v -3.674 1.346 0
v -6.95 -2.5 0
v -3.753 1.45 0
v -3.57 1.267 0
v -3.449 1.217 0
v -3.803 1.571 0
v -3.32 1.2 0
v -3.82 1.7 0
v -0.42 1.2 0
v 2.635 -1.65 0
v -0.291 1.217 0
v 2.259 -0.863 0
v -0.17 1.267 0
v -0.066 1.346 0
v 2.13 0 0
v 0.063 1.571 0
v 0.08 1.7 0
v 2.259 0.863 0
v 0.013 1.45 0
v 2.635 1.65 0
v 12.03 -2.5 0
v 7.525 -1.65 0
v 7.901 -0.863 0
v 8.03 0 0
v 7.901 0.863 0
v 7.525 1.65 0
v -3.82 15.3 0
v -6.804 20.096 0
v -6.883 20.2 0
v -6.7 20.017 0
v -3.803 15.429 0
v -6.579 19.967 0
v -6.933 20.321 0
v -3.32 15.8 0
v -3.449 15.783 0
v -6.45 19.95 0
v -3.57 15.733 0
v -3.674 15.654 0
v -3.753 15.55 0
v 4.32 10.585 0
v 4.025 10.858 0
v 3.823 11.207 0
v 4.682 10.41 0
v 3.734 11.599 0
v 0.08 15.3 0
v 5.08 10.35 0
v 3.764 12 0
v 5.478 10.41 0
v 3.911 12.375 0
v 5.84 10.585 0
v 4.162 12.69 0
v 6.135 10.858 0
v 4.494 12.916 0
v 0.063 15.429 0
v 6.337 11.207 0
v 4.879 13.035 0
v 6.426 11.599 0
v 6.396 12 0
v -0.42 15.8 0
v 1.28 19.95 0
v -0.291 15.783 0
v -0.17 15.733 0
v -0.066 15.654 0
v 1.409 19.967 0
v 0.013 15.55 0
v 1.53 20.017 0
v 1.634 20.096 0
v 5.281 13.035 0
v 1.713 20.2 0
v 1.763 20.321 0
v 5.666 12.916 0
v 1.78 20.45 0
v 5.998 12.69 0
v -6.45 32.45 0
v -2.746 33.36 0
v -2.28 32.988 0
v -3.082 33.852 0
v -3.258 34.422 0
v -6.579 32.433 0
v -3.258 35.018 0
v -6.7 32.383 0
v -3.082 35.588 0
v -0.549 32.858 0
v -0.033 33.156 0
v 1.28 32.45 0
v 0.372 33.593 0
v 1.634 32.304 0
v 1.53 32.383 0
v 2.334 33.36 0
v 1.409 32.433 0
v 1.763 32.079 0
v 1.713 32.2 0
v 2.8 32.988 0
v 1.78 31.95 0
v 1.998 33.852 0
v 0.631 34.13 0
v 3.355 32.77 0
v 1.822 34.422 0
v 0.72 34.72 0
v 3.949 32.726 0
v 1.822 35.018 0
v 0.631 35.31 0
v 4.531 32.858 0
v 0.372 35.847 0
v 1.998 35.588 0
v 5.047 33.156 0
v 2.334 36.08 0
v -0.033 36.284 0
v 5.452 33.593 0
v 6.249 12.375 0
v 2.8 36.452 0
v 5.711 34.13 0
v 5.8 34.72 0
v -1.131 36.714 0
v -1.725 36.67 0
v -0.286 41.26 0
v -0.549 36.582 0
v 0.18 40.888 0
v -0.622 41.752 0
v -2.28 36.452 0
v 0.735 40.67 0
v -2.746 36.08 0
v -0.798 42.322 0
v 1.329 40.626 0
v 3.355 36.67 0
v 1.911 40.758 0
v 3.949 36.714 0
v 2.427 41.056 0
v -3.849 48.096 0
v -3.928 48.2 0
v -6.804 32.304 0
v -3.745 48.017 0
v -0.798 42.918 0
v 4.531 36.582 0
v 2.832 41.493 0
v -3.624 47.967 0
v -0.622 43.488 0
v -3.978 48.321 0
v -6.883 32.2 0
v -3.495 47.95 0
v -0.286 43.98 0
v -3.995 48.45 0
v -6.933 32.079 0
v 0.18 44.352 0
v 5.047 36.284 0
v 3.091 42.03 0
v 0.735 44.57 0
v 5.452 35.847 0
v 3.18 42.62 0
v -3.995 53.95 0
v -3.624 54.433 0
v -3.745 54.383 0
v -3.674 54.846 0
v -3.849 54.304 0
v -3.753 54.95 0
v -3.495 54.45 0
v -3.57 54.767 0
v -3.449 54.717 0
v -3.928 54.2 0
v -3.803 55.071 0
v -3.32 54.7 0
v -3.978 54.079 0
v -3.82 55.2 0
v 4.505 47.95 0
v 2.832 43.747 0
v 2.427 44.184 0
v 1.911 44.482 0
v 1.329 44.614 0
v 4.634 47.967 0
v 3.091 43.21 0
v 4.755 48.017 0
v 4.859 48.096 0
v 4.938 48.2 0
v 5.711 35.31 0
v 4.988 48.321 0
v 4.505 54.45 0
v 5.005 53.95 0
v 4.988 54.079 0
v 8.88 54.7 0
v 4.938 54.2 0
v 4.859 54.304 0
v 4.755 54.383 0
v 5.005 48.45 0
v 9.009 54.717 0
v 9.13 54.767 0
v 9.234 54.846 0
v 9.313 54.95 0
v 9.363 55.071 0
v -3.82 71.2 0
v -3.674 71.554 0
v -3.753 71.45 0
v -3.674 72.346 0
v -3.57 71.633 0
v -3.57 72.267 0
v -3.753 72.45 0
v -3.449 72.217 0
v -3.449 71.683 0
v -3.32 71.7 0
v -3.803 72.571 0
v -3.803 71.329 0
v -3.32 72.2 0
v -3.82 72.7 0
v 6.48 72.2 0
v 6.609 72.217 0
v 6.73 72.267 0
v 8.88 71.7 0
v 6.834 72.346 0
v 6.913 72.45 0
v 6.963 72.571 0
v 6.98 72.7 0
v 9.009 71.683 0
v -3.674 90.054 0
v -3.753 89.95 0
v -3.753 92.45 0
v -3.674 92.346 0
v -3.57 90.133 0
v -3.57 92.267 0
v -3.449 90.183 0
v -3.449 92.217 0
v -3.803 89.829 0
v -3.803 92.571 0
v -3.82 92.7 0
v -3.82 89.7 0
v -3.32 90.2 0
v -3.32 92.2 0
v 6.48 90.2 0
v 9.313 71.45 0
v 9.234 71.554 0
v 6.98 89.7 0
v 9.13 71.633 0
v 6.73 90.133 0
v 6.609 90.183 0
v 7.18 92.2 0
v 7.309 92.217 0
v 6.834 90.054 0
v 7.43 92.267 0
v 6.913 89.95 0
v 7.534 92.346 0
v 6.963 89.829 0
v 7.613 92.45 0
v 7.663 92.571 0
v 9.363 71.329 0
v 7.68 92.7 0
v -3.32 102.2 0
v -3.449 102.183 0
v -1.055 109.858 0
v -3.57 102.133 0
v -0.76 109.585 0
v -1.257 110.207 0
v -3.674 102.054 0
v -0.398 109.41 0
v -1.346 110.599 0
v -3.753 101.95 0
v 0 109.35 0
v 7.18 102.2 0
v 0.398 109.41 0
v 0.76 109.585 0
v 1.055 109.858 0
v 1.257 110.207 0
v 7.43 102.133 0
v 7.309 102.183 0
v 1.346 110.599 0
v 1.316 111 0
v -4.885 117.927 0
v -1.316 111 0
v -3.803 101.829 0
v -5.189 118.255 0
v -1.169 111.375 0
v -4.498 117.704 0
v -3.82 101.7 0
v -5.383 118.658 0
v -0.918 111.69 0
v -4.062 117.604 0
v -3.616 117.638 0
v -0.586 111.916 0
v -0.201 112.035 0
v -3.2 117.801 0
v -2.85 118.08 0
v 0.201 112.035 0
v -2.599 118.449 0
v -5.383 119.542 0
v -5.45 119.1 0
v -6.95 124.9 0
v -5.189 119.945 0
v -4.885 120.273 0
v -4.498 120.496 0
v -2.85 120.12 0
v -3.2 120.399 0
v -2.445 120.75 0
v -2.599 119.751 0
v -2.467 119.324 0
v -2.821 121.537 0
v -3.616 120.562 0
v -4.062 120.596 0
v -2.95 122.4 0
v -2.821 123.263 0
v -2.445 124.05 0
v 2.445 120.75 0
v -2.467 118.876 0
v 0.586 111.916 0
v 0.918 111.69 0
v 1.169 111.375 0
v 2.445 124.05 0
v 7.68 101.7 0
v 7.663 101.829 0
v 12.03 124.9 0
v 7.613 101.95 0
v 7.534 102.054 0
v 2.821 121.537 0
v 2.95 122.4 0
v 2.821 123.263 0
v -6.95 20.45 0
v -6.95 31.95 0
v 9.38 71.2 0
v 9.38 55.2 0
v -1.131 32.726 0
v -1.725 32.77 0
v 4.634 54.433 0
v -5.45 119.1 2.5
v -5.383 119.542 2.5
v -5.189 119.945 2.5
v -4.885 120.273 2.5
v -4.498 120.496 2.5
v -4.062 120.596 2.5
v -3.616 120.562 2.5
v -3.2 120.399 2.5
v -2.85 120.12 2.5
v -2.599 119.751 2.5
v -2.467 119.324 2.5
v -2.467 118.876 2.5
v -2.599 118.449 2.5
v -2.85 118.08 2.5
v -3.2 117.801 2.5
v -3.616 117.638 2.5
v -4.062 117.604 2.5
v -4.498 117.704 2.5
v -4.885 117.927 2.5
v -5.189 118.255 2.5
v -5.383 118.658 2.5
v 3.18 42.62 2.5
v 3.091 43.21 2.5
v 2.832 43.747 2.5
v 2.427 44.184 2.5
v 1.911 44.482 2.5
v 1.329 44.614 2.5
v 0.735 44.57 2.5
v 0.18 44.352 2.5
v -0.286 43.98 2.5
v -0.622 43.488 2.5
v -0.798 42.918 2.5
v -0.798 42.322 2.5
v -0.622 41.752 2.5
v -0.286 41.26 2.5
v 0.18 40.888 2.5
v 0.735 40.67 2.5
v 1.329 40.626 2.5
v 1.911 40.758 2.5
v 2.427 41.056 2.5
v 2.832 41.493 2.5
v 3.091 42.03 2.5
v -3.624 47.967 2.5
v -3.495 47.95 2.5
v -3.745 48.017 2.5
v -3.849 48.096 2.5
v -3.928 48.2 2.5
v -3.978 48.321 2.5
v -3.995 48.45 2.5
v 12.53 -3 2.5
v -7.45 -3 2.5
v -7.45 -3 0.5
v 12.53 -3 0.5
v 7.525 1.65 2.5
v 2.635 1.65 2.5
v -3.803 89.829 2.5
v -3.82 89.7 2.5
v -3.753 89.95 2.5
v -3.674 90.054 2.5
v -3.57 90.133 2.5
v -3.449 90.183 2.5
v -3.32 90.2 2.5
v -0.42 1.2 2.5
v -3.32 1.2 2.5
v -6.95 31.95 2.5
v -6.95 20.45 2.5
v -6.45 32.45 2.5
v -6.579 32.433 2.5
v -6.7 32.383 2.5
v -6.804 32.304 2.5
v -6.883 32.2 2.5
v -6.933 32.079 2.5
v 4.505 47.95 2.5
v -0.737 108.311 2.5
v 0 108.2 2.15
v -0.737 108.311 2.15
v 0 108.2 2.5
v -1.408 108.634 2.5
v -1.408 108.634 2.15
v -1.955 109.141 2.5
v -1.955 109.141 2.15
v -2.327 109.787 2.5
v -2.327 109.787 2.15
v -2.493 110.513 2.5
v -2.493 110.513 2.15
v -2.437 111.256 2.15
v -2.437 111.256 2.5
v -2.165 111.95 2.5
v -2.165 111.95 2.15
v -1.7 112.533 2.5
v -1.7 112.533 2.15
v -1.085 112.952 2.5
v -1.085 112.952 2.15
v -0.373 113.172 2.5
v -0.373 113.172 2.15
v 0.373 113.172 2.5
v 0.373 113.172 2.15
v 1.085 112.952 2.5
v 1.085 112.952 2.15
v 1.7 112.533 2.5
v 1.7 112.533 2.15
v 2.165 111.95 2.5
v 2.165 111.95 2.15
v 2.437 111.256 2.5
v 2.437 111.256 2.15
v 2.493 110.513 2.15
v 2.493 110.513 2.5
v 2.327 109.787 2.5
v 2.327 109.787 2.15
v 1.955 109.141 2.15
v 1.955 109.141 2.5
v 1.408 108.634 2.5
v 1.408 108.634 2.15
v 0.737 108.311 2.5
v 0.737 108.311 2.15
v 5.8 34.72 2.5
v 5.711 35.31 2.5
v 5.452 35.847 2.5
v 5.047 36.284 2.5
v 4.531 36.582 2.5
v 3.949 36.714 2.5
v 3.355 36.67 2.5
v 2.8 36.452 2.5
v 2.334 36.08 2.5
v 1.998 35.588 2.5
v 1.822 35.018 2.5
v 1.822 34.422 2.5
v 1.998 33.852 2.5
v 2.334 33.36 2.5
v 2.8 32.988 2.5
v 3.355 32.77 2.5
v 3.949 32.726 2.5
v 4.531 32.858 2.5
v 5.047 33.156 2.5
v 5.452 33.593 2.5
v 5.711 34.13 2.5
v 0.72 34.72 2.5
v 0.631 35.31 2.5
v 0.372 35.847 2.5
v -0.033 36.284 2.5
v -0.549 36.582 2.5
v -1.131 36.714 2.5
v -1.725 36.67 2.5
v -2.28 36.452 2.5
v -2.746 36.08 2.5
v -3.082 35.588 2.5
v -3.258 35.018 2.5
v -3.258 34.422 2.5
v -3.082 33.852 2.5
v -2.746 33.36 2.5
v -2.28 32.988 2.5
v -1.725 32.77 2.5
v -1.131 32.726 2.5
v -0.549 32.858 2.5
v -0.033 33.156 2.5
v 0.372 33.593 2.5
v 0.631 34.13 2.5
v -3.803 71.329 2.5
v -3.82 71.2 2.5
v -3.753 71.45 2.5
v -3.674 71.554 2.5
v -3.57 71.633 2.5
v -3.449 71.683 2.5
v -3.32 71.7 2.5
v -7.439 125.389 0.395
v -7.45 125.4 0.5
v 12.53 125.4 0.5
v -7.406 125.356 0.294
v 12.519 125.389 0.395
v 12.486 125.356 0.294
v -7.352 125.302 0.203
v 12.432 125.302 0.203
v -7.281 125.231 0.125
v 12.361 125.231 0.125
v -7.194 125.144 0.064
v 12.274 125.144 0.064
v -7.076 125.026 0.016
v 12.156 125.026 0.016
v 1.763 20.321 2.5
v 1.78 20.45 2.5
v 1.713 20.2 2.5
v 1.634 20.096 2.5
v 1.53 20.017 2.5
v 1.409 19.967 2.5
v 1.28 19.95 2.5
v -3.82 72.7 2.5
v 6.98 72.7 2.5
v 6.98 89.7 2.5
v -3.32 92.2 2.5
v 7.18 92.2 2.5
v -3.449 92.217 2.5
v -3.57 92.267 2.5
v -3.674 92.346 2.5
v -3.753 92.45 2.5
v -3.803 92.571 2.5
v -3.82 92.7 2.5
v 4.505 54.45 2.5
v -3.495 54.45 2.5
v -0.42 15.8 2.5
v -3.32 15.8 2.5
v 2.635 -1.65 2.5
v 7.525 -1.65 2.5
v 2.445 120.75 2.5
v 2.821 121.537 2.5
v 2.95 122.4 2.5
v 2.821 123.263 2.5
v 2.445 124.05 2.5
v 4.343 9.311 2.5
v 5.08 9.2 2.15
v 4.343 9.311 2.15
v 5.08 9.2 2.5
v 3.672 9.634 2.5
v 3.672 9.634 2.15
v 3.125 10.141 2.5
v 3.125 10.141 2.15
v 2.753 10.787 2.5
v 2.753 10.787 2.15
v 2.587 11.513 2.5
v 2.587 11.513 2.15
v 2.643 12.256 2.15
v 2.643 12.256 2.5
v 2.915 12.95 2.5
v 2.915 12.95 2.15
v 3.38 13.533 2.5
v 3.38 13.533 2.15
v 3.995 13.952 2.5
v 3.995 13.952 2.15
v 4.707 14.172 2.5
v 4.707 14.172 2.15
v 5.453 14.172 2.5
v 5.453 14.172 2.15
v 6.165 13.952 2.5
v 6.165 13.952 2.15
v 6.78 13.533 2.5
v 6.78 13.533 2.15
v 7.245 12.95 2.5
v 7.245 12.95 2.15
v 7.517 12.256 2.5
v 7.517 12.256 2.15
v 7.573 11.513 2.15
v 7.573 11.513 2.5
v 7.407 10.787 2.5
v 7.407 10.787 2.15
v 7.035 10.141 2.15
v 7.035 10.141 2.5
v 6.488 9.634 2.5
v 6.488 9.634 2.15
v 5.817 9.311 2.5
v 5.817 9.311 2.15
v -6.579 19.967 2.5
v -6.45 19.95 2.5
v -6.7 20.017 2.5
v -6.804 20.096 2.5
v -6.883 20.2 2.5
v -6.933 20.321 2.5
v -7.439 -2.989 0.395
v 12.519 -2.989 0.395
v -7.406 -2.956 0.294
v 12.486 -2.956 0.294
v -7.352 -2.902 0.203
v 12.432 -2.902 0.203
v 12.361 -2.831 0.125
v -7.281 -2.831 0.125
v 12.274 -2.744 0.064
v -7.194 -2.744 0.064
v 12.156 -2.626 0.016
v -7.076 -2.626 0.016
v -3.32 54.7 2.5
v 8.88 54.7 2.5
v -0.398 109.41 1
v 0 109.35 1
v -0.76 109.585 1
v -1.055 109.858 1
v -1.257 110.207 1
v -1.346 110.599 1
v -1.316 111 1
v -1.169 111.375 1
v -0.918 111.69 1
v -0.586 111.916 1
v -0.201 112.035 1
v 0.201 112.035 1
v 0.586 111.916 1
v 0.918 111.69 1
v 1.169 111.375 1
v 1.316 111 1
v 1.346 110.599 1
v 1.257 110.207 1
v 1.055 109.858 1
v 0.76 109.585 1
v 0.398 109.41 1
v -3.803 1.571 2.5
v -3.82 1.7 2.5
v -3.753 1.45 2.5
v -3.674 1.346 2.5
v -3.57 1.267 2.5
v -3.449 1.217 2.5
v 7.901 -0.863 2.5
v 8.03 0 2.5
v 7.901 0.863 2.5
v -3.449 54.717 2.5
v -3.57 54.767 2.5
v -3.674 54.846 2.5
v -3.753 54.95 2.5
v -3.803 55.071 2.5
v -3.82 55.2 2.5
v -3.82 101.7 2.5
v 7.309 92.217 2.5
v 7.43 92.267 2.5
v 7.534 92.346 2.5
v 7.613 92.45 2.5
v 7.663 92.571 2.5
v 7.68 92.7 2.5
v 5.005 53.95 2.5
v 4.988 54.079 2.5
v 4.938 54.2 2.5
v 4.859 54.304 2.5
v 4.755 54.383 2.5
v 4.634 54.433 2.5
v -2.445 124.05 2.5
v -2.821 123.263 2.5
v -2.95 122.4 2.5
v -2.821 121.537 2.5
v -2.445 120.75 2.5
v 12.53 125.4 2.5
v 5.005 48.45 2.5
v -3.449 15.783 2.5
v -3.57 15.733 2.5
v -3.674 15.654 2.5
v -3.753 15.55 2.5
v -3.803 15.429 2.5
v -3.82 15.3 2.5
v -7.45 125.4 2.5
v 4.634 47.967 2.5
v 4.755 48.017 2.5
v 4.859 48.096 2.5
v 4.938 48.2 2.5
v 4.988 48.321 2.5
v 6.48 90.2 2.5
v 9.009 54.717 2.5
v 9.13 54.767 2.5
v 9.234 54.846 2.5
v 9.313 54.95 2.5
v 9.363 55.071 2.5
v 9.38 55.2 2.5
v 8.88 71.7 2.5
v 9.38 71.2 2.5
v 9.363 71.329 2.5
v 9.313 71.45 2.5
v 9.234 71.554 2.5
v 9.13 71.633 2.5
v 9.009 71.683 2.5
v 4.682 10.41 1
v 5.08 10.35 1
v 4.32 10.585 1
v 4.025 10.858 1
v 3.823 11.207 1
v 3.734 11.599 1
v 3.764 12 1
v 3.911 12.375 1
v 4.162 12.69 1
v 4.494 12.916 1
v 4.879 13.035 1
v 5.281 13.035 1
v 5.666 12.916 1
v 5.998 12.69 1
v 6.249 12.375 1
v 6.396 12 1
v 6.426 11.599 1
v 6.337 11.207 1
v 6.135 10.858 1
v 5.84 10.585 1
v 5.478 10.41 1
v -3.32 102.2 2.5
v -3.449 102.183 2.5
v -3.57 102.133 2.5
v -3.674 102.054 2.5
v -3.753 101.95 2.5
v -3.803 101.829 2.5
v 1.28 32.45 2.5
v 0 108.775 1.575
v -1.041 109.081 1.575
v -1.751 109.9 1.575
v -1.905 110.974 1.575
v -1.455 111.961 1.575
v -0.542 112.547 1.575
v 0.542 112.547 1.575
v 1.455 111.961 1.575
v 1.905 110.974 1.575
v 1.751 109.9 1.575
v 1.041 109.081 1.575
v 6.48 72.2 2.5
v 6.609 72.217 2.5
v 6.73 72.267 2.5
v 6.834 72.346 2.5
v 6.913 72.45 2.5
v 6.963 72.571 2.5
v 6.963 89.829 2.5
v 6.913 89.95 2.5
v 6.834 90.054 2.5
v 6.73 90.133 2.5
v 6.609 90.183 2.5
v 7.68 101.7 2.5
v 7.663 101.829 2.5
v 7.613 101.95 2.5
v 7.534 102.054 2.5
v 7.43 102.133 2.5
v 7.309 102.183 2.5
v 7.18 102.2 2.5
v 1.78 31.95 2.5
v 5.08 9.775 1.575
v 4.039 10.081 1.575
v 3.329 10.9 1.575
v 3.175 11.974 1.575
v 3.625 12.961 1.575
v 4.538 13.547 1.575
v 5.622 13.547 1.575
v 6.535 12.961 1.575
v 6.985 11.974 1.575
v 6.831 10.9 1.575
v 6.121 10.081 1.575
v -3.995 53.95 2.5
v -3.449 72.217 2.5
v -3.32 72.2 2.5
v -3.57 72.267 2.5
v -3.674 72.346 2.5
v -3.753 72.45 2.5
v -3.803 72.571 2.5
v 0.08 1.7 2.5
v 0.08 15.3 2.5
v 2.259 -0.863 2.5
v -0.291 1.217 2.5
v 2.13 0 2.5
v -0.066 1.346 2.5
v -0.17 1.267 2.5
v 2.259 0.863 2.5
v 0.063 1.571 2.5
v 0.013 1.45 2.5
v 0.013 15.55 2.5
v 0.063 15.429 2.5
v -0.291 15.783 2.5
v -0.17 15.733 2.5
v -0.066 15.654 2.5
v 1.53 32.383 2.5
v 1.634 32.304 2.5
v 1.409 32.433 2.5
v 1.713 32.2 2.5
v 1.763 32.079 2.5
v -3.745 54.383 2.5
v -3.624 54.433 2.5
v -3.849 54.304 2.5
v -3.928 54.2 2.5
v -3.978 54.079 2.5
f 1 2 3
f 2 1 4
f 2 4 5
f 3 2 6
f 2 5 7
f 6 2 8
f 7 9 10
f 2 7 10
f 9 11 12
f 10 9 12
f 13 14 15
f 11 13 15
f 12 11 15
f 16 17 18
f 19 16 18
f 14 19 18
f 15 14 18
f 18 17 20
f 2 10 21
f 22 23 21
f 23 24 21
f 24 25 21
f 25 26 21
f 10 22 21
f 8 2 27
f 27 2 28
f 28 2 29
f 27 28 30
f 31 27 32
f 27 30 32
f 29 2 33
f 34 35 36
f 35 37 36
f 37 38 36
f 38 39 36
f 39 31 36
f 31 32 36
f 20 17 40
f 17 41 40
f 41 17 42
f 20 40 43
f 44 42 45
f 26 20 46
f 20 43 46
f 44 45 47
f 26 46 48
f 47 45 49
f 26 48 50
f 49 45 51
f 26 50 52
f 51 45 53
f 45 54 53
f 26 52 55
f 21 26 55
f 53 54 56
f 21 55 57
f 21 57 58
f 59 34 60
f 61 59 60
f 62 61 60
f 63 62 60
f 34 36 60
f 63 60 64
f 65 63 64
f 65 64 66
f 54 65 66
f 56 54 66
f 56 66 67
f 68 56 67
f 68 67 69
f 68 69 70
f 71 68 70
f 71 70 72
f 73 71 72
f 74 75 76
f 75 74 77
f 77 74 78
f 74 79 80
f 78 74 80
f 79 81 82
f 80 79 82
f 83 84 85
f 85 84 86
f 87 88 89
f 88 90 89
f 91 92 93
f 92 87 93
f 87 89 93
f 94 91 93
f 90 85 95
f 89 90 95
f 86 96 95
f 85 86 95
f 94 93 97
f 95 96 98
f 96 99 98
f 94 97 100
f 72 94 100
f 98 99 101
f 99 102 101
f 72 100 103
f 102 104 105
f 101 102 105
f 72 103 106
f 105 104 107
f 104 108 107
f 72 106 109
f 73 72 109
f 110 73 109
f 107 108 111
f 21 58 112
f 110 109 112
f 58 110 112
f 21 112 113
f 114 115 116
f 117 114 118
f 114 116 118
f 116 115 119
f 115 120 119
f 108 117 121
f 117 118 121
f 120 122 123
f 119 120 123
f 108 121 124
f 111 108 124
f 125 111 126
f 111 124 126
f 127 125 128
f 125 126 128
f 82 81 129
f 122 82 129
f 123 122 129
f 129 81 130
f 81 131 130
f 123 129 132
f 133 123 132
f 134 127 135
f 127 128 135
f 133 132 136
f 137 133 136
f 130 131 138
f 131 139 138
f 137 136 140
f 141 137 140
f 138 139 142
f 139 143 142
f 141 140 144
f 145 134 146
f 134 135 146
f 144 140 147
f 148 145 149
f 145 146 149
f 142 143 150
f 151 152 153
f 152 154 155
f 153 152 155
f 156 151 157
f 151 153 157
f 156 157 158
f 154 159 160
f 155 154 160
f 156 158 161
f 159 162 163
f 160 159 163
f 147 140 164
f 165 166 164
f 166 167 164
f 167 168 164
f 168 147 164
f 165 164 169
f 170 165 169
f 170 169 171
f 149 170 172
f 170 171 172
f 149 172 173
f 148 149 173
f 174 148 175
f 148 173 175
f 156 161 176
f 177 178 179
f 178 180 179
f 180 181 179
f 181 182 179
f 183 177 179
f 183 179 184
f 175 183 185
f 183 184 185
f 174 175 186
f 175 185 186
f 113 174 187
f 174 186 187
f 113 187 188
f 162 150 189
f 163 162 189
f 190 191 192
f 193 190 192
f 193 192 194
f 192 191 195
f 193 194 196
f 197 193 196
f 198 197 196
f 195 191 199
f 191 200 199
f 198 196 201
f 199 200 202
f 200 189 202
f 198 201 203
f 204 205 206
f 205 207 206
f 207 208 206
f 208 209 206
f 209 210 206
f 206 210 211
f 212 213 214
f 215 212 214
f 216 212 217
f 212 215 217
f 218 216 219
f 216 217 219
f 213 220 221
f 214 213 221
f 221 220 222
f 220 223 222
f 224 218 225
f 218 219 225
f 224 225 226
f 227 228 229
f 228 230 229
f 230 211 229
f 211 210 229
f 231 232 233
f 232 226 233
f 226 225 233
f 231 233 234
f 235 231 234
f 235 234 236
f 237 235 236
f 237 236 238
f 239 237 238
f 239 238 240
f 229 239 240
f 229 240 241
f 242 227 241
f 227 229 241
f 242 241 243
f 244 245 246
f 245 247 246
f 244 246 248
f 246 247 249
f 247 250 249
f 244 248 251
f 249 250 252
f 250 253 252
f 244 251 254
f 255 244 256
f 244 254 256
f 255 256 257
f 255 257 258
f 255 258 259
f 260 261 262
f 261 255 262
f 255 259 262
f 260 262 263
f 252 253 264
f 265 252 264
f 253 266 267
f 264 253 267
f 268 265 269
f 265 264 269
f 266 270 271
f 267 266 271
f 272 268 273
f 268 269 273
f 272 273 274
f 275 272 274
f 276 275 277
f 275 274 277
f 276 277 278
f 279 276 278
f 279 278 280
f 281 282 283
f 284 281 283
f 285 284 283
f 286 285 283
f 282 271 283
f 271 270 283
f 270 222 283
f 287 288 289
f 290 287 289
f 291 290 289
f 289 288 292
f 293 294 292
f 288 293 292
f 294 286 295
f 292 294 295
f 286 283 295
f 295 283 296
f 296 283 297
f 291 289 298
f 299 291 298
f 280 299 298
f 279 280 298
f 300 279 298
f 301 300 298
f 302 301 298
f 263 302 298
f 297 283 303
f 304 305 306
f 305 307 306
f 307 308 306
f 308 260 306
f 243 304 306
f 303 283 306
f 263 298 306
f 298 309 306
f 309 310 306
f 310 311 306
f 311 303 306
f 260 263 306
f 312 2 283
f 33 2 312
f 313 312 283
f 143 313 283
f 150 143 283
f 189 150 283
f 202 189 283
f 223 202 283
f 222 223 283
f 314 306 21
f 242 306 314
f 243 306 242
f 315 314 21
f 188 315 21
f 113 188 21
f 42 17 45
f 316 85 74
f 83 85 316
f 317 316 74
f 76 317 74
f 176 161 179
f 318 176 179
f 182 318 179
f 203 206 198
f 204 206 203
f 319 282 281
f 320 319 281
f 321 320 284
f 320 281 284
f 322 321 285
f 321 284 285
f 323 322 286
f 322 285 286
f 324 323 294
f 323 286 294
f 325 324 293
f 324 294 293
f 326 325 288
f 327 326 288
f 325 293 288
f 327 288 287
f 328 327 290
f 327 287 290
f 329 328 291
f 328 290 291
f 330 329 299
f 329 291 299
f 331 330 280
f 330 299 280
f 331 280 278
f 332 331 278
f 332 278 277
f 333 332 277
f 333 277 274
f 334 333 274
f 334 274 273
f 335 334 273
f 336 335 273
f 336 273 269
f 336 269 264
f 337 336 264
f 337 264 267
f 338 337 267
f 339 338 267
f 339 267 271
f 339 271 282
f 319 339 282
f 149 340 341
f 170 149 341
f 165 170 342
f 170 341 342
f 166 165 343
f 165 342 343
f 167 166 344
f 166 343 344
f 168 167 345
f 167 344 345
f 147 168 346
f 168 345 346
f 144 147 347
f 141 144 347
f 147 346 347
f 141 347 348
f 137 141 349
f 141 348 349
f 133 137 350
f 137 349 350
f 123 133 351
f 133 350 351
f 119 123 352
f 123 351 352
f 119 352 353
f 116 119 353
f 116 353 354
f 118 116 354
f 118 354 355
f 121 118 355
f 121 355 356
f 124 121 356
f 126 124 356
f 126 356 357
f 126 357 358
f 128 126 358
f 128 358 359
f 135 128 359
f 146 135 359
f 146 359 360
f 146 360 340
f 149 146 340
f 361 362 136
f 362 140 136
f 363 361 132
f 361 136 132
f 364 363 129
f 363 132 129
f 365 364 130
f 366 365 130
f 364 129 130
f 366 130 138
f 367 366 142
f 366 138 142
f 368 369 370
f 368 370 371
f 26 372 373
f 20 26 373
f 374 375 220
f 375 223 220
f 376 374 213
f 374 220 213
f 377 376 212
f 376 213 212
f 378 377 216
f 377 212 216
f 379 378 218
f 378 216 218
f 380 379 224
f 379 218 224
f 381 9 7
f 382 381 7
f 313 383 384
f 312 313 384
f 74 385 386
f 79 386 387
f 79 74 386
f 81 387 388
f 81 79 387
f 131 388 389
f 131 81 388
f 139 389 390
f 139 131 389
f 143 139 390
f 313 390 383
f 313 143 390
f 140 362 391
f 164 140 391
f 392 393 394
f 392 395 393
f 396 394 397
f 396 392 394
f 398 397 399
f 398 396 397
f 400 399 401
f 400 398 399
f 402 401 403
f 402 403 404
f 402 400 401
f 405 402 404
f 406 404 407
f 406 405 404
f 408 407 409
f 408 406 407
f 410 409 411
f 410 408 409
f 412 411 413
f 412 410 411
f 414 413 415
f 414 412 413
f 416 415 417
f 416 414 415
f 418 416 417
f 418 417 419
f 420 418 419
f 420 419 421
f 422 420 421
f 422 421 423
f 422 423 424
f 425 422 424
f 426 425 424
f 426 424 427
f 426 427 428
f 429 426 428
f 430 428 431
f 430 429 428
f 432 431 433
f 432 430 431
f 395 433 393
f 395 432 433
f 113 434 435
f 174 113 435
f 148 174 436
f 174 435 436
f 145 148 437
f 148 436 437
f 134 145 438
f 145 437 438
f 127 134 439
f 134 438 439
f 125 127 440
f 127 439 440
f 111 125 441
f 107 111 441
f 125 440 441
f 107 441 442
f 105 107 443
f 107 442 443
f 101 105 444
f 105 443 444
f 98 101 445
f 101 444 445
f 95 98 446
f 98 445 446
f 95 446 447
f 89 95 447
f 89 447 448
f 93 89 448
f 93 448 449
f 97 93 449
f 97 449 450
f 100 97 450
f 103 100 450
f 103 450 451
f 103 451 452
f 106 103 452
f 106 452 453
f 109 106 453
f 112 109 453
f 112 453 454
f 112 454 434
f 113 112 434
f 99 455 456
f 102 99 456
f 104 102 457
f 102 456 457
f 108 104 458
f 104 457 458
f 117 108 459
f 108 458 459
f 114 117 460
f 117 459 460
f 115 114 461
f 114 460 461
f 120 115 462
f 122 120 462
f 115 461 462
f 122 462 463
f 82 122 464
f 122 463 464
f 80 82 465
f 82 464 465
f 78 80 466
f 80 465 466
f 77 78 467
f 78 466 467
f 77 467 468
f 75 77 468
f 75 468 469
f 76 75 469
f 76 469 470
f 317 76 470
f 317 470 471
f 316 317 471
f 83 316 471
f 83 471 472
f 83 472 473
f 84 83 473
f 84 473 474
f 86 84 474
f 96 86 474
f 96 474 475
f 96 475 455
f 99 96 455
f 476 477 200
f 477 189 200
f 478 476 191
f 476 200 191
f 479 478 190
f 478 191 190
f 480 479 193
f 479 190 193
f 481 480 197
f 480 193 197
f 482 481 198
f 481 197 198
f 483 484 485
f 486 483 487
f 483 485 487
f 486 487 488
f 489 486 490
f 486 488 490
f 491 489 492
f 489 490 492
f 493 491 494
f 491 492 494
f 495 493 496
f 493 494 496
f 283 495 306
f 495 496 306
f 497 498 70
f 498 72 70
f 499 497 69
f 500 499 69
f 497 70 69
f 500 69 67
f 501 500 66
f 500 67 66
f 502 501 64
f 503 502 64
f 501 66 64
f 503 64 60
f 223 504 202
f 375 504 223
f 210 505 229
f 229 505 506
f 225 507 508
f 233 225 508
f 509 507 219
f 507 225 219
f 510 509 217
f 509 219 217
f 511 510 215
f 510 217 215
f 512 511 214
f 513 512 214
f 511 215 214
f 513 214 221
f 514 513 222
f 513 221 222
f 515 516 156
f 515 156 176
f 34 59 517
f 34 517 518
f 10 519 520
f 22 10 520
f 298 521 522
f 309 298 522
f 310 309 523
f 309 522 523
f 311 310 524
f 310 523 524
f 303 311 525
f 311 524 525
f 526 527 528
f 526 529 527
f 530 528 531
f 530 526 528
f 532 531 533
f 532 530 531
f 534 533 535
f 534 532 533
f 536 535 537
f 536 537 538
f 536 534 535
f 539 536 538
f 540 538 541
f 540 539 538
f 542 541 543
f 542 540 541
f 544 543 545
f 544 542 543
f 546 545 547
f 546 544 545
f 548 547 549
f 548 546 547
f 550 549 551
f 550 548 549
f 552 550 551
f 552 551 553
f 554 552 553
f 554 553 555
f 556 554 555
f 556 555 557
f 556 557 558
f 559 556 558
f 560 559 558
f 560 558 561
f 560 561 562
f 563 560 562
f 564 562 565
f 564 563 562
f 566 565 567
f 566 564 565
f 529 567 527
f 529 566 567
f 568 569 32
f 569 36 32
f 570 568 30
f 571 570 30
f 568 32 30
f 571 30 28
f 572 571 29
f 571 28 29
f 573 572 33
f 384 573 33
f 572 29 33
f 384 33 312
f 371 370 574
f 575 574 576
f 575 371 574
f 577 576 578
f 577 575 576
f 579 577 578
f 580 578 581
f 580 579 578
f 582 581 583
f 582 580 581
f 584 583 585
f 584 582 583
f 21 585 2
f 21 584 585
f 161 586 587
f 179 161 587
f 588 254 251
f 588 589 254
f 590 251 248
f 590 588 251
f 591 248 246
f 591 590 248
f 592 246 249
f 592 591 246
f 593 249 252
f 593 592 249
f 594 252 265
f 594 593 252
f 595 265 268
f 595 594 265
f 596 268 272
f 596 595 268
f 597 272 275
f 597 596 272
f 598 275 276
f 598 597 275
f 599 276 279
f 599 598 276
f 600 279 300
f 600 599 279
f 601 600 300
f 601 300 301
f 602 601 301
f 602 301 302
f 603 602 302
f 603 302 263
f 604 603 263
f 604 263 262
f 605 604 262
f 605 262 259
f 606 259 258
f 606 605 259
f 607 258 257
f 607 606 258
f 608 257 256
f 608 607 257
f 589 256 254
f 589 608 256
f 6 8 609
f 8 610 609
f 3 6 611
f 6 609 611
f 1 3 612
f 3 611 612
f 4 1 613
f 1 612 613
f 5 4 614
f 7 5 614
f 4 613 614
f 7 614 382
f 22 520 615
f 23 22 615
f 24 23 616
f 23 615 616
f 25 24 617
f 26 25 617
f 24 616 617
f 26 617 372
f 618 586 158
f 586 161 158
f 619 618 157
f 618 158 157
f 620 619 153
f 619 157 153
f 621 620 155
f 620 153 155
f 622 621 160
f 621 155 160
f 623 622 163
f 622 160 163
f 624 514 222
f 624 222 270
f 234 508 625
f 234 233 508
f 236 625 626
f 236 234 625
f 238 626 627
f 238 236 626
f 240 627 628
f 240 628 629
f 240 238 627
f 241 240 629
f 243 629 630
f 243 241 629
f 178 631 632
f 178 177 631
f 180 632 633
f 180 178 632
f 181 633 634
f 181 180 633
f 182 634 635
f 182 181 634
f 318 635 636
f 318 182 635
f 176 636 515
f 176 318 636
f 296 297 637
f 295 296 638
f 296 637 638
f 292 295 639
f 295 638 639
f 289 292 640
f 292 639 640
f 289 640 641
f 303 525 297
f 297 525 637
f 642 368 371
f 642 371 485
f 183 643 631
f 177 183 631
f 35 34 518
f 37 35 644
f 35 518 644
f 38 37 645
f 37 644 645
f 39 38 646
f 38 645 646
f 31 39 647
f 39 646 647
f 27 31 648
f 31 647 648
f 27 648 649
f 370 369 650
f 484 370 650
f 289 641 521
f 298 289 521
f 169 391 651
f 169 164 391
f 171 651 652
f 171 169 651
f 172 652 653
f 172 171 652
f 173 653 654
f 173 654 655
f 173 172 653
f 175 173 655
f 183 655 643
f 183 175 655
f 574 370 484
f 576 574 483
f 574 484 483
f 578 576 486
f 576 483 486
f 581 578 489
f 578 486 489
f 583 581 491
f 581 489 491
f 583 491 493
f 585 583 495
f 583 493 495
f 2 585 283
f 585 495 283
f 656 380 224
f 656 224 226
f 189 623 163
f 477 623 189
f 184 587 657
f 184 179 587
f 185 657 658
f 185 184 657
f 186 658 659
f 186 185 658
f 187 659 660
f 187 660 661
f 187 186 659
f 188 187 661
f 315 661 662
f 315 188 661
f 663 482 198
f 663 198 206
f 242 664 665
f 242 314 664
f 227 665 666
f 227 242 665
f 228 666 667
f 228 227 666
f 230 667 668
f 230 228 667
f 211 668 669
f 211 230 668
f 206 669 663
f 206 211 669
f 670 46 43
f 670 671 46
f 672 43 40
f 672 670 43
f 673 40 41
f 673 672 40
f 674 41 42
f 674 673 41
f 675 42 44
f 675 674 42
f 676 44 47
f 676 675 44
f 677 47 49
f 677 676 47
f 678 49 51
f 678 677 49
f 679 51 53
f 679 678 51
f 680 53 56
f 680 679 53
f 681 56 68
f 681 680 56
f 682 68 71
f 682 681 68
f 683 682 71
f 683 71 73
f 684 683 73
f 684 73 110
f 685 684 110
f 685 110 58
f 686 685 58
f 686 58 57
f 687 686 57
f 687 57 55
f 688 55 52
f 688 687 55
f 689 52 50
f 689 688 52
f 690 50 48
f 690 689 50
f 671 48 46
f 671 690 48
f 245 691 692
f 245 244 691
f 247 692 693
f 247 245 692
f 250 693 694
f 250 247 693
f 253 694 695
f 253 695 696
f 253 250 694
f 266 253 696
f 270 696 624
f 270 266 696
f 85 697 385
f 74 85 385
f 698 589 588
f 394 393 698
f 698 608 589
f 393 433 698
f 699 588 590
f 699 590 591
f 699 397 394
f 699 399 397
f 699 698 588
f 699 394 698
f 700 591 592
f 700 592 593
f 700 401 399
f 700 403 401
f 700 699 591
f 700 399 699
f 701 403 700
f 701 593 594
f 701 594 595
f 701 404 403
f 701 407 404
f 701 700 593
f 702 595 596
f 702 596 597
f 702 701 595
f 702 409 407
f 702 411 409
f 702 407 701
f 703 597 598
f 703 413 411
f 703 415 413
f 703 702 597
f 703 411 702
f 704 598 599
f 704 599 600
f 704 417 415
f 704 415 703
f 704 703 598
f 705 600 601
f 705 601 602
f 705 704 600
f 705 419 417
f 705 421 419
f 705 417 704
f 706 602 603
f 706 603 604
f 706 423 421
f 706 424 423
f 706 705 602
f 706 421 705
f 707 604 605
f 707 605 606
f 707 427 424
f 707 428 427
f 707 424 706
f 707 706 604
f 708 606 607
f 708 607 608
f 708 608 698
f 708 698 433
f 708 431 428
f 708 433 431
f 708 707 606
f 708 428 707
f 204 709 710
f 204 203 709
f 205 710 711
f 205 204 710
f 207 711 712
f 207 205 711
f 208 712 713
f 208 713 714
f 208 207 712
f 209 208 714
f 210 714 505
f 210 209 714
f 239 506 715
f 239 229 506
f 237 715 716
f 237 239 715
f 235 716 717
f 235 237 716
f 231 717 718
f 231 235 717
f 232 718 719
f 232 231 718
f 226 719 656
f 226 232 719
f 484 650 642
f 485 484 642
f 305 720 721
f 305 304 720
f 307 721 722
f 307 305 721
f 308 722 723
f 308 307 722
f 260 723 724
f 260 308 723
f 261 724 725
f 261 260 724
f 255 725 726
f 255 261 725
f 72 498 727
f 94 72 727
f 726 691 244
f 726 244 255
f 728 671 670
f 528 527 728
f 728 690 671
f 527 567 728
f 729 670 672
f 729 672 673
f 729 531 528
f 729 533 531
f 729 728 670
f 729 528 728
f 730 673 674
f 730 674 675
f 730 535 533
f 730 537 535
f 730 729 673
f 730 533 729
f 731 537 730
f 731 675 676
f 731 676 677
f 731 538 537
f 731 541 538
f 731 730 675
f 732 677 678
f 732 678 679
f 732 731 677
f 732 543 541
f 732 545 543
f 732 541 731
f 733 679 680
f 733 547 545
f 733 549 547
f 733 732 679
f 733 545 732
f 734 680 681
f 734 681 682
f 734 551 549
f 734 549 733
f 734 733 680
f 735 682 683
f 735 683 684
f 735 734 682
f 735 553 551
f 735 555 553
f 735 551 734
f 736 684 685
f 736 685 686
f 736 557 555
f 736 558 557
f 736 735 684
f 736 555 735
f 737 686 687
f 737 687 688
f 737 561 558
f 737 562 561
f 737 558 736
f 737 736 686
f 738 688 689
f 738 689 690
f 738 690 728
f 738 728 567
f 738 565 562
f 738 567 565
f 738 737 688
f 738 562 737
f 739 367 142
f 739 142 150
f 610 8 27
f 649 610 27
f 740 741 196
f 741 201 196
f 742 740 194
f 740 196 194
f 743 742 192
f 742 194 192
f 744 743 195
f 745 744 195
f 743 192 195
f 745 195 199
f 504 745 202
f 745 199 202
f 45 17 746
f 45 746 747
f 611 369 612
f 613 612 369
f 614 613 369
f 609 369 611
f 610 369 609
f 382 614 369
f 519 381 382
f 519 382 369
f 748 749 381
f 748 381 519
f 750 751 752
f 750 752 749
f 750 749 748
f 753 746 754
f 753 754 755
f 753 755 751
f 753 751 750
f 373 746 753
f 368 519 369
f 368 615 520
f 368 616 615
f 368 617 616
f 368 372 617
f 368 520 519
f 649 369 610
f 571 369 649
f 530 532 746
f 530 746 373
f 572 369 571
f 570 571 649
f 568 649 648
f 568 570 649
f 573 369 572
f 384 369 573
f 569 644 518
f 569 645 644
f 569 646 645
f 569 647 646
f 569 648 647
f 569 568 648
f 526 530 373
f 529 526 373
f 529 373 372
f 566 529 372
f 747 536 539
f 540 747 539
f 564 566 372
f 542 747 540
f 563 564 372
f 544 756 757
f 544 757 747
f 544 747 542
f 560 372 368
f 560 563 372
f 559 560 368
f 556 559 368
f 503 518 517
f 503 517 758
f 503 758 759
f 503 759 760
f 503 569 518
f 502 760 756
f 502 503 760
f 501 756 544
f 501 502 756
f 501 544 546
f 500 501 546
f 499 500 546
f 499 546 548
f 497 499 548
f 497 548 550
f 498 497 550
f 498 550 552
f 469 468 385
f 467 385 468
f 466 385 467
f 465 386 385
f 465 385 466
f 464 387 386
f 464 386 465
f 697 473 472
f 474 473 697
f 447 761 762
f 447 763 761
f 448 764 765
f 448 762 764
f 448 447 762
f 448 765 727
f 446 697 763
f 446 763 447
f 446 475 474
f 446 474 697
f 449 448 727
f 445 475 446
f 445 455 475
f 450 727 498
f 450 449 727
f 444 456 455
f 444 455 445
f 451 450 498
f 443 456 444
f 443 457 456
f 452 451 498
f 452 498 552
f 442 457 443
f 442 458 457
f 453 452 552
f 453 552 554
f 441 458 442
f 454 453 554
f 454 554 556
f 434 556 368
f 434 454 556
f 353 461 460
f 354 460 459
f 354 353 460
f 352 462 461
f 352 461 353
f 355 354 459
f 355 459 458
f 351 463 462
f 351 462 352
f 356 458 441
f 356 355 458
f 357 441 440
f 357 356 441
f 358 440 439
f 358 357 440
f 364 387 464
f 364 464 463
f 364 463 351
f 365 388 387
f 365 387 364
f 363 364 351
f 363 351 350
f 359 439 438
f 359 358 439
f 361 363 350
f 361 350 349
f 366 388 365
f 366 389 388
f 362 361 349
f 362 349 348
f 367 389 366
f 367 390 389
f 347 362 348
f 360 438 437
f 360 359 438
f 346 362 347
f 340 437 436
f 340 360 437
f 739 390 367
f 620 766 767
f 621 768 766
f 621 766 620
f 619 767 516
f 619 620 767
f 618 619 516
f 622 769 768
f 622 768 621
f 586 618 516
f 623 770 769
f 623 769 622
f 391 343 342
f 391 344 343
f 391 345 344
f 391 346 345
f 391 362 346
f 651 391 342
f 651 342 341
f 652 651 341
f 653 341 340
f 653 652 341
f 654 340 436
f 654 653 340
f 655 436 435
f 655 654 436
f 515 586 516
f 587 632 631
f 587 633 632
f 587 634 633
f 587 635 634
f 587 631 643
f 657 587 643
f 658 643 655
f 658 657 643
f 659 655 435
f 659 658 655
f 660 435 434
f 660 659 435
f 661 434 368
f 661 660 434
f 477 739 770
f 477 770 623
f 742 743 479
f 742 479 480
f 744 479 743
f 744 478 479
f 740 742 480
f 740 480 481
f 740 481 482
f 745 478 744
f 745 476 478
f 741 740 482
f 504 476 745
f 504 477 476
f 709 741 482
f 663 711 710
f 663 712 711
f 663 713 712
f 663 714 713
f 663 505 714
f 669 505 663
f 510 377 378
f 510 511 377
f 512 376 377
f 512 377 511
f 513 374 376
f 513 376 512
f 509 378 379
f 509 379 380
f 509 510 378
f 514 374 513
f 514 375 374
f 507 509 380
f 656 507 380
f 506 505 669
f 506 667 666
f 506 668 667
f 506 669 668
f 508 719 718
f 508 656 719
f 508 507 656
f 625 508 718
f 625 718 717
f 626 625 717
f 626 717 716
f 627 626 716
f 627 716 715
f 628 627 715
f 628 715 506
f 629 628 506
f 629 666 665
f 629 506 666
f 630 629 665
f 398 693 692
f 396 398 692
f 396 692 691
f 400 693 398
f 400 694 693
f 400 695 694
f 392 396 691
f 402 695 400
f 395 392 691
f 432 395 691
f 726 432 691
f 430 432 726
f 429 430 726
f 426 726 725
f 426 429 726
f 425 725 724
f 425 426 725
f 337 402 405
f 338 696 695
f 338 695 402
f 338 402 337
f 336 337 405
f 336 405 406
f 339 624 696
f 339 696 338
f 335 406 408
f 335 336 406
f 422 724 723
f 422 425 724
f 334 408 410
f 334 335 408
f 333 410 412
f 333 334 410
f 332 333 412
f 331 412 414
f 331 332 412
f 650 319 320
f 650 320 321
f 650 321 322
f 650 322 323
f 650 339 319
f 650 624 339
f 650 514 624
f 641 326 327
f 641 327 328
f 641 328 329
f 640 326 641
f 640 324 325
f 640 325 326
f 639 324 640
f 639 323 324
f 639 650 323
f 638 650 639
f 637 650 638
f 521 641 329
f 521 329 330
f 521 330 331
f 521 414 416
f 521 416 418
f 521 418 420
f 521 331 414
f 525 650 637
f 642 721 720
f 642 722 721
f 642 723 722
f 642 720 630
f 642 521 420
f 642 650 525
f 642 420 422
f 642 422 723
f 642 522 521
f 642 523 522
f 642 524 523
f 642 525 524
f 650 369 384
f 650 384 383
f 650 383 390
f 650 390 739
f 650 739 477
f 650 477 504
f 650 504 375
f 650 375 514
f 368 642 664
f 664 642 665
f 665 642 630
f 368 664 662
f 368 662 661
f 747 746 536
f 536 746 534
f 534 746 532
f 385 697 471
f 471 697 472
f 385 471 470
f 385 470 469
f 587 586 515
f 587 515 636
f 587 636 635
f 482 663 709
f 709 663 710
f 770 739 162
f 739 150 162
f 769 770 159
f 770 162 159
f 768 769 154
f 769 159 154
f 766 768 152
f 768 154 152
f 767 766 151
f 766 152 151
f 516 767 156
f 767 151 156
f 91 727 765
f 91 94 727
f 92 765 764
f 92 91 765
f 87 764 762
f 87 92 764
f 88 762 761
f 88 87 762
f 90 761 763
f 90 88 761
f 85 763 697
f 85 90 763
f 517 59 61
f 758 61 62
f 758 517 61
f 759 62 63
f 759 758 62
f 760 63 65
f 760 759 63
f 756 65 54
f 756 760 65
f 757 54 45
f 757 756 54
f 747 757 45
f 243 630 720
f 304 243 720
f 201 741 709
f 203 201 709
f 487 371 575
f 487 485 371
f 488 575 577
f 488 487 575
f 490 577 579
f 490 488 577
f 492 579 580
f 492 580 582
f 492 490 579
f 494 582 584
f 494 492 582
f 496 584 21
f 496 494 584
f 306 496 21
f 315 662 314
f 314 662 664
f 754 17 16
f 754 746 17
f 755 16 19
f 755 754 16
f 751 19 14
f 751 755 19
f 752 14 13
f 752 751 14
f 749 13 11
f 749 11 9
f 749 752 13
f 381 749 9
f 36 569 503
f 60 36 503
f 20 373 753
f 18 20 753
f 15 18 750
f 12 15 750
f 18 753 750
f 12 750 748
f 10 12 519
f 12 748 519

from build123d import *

# Parameters (mm, degrees)
SKETCH1_W                                      = 19.98
SKETCH1_H                                      = 128.4
BOSS_EXTRUDE1_DEPTH                            = 2.5
CUT_EXTRUDE1_DEPTH                             = 127.049239982
CUT_EXTRUDE2_DEPTH                             = 127.049239982
SKETCH4_W                                      = 3.9
SKETCH4_H                                      = 14.6
CUT_EXTRUDE3_DEPTH                             = 127.049239982
F_3_0_3_DIAMETER_HOLE1_D                       = 3
CSK_FOR_M2_5_FLAT_HEAD_MACHINE_SCREW1_AT_COUNT = 2
CSK_FOR_M2_5_FLAT_HEAD_MACHINE_SCREW1_AT_PITCH = 99.130249672
USB_DEPTH                                      = 127.049239982
SKETCH10_R                                     = 2
LEDS_DEPTH                                     = 127.049239982
SKETCH11_R                                     = 2
SINGLE_LED_DEPTH                               = 127.049239982
SKETCH13_W                                     = 9
SKETCH13_H                                     = 6.5
DISABLE_COMMS_DEPTH                            = 127.049239982
SKETCH14_W                                     = 13.2
SKETCH14_H                                     = 17
RJ45_DEPTH                                     = 127.049239982
SKETCH15_W                                     = 10.8
SKETCH15_H                                     = 18
OUTPUT_DEPTH                                   = 127.049239982
SKETCH16_W                                     = 11.5
SKETCH16_H                                     = 10
POWER_DEPTH                                    = 127.049239982
FILLETS_R                                      = 0.5
FILLET2_R                                      = 0.5


with BuildPart() as part:
    # Sketch1 → Boss-Extrude1 (new body)
    with BuildSketch(Plane.XY.offset(2.5)):
        with Locations((2.54, 61.2)):
            Rectangle(SKETCH1_W, SKETCH1_H)
    extrude(amount=-BOSS_EXTRUDE1_DEPTH)

    # Sketch2 → Cut-Extrude1 (cut, through all)
    with BuildSketch(Plane.XY.offset(2.5)):
        with BuildLine():
            Line((2.445403852, 124.05), (-2.445403852, 124.05))
            ThreePointArc((-2.445403852, 124.05), (-2.95, 122.4), (-2.445403852, 120.75))
            Line((-2.445403852, 120.75), (2.445403852, 120.75))
            ThreePointArc((2.445403852, 120.75), (2.95, 122.4), (2.445403852, 124.05))
        make_face()
    extrude(amount=-CUT_EXTRUDE1_DEPTH, mode=Mode.SUBTRACT)

    # Sketch3 → Cut-Extrude2 (cut, through all)
    with BuildSketch(Plane.XY.offset(2.5)):
        with BuildLine():
            Line((7.525403852, 1.65), (2.634596148, 1.65))
            ThreePointArc((2.634596148, 1.65), (2.13, 0), (2.634596148, -1.65))
            Line((2.634596148, -1.65), (7.525403852, -1.65))
            ThreePointArc((7.525403852, -1.65), (8.03, 0), (7.525403852, 1.65))
        make_face()
    extrude(amount=-CUT_EXTRUDE2_DEPTH, mode=Mode.SUBTRACT)

    # Sketch4 → Cut-Extrude3 (cut, through all)
    with BuildSketch(Plane(origin=(0, 0, 0), x_dir=(-1, 0, 0), z_dir=(0, 0, -1))):
        with Locations((1.87, 8.5)):
            Rectangle(SKETCH4_W, SKETCH4_H)
    extrude(amount=-CUT_EXTRUDE3_DEPTH, mode=Mode.SUBTRACT)

    # Ø3.0 (3) Diameter Hole1 (through all)
    with Locations(Plane.XY.offset(2.5)):
        with Locations((-3.95, 119.1)):
            Hole(F_3_0_3_DIAMETER_HOLE1_D / 2)

    # Sketch7 → CSK for M2.5 Flat Head Machine Screw1 (revolve, cut)
    with BuildSketch(Plane(origin=(5.08, 11.7, 2.5), x_dir=(0, -1, 0), z_dir=(1, 0, 0))):
        Polygon((0, 0), (0, 2.5), (1.35, 2.5), (1.35, 1.5), (2.5, 0.35), (2.5, 0), align=None)
    csk_for_m2_5_flat_head_machine_screw1 = revolve(axis=Axis((5.08, 11.7, 8.85), (0, 0, -1)), mode=Mode.SUBTRACT)

    # CSK for M2.5 Flat Head Machine Screw1 at: CSK for M2.5 Flat Head Machine Screw1 ×2
    with Locations(*[Vector(-0.05124570972853528, 0.9986860754183062, 0) * (i * CSK_FOR_M2_5_FLAT_HEAD_MACHINE_SCREW1_AT_PITCH) for i in range(1, CSK_FOR_M2_5_FLAT_HEAD_MACHINE_SCREW1_AT_COUNT)]):
        add(csk_for_m2_5_flat_head_machine_screw1, mode=Mode.SUBTRACT)

    # Sketch9 → USB (cut, through all)
    with BuildSketch(Plane.XY.offset(2.5)):
        Polygon((-3.82, 19.95), (1.78, 19.95), (1.78, 32.45), (-3.82, 32.45), (-6.95, 32.45), (-6.95, 19.95), align=None)
    extrude(amount=-USB_DEPTH, mode=Mode.SUBTRACT)

    # Sketch10 → LEDs (cut, through all)
    with BuildSketch(Plane.XY.offset(2.5)):
        with Locations((-1.28, 34.72)):
            Circle(SKETCH10_R)
        with Locations((3.8, 34.72)):
            Circle(SKETCH10_R)
    extrude(amount=-LEDS_DEPTH, mode=Mode.SUBTRACT)

    # Sketch11 → Single LED (cut, through all)
    with BuildSketch(Plane.XY.offset(2.5)):
        with Locations((1.18, 42.62)):
            Circle(SKETCH11_R)
    extrude(amount=-SINGLE_LED_DEPTH, mode=Mode.SUBTRACT)

    # Sketch13 → Disable comms (cut, through all)
    with BuildSketch(Plane.XY.offset(2.5)):
        with Locations((0.505, 51.2)):
            Rectangle(SKETCH13_W, SKETCH13_H)
    extrude(amount=-DISABLE_COMMS_DEPTH, mode=Mode.SUBTRACT)

    # Sketch14 → RJ45 (cut, through all)
    with BuildSketch(Plane.XY.offset(2.5)):
        with Locations((2.78, 63.2)):
            Rectangle(SKETCH14_W, SKETCH14_H)
    extrude(amount=-RJ45_DEPTH, mode=Mode.SUBTRACT)

    # Sketch15 → Output (cut, through all)
    with BuildSketch(Plane.XY.offset(2.5)):
        with Locations((1.58, 81.2)):
            Rectangle(SKETCH15_W, SKETCH15_H)
    extrude(amount=-OUTPUT_DEPTH, mode=Mode.SUBTRACT)

    # Sketch16 → Power (cut, through all)
    with BuildSketch(Plane.XY.offset(2.5)):
        with Locations((1.93, 97.2)):
            Rectangle(SKETCH16_W, SKETCH16_H)
    extrude(amount=-POWER_DEPTH, mode=Mode.SUBTRACT)

    # Fillets
    fillets_edges = [part.edges().sort_by_distance(p)[0] for p in [
        (5.005, 54.45, 1.25),
        (5.005, 47.95, 1.25),
        (-3.995, 47.95, 1.25),
        (-3.995, 54.45, 1.25),
        (9.38, 54.7, 1.25),
        (-3.82, 54.7, 1.25),
        (-3.82, 71.7, 1.25),
        (9.38, 71.7, 1.25),
        (6.98, 72.2, 1.25),
        (-3.82, 72.2, 1.25),
        (-3.82, 90.2, 1.25),
        (6.98, 90.2, 1.25),
        (7.68, 92.2, 1.25),
        (-3.82, 92.2, 1.25),
        (-3.82, 102.2, 1.25),
        (7.68, 102.2, 1.25),
        (-3.82, 15.8, 1.25),
        (-3.82, 1.2, 1.25),
        (0.08, 1.2, 1.25),
        (0.08, 15.8, 1.25),
        (-6.95, 19.95, 1.25),
        (-6.95, 32.45, 1.25),
        (1.78, 32.45, 1.25),
        (1.78, 19.95, 1.25),
    ]]
    fillet(fillets_edges, radius=FILLETS_R)

    # Fillet2
    fillet2_edges = [part.edges().sort_by_distance(p)[0] for p in [
        (-7.45, 61.2, 0),
        (2.54, -3, 0),
        (12.53, 61.2, 0),
        (2.54, 125.4, 0),
    ]]
    fillet(fillet2_edges, radius=FILLET2_R - 0.0001)  # a hair under: the kernel refuses the full size


solid = part.part
